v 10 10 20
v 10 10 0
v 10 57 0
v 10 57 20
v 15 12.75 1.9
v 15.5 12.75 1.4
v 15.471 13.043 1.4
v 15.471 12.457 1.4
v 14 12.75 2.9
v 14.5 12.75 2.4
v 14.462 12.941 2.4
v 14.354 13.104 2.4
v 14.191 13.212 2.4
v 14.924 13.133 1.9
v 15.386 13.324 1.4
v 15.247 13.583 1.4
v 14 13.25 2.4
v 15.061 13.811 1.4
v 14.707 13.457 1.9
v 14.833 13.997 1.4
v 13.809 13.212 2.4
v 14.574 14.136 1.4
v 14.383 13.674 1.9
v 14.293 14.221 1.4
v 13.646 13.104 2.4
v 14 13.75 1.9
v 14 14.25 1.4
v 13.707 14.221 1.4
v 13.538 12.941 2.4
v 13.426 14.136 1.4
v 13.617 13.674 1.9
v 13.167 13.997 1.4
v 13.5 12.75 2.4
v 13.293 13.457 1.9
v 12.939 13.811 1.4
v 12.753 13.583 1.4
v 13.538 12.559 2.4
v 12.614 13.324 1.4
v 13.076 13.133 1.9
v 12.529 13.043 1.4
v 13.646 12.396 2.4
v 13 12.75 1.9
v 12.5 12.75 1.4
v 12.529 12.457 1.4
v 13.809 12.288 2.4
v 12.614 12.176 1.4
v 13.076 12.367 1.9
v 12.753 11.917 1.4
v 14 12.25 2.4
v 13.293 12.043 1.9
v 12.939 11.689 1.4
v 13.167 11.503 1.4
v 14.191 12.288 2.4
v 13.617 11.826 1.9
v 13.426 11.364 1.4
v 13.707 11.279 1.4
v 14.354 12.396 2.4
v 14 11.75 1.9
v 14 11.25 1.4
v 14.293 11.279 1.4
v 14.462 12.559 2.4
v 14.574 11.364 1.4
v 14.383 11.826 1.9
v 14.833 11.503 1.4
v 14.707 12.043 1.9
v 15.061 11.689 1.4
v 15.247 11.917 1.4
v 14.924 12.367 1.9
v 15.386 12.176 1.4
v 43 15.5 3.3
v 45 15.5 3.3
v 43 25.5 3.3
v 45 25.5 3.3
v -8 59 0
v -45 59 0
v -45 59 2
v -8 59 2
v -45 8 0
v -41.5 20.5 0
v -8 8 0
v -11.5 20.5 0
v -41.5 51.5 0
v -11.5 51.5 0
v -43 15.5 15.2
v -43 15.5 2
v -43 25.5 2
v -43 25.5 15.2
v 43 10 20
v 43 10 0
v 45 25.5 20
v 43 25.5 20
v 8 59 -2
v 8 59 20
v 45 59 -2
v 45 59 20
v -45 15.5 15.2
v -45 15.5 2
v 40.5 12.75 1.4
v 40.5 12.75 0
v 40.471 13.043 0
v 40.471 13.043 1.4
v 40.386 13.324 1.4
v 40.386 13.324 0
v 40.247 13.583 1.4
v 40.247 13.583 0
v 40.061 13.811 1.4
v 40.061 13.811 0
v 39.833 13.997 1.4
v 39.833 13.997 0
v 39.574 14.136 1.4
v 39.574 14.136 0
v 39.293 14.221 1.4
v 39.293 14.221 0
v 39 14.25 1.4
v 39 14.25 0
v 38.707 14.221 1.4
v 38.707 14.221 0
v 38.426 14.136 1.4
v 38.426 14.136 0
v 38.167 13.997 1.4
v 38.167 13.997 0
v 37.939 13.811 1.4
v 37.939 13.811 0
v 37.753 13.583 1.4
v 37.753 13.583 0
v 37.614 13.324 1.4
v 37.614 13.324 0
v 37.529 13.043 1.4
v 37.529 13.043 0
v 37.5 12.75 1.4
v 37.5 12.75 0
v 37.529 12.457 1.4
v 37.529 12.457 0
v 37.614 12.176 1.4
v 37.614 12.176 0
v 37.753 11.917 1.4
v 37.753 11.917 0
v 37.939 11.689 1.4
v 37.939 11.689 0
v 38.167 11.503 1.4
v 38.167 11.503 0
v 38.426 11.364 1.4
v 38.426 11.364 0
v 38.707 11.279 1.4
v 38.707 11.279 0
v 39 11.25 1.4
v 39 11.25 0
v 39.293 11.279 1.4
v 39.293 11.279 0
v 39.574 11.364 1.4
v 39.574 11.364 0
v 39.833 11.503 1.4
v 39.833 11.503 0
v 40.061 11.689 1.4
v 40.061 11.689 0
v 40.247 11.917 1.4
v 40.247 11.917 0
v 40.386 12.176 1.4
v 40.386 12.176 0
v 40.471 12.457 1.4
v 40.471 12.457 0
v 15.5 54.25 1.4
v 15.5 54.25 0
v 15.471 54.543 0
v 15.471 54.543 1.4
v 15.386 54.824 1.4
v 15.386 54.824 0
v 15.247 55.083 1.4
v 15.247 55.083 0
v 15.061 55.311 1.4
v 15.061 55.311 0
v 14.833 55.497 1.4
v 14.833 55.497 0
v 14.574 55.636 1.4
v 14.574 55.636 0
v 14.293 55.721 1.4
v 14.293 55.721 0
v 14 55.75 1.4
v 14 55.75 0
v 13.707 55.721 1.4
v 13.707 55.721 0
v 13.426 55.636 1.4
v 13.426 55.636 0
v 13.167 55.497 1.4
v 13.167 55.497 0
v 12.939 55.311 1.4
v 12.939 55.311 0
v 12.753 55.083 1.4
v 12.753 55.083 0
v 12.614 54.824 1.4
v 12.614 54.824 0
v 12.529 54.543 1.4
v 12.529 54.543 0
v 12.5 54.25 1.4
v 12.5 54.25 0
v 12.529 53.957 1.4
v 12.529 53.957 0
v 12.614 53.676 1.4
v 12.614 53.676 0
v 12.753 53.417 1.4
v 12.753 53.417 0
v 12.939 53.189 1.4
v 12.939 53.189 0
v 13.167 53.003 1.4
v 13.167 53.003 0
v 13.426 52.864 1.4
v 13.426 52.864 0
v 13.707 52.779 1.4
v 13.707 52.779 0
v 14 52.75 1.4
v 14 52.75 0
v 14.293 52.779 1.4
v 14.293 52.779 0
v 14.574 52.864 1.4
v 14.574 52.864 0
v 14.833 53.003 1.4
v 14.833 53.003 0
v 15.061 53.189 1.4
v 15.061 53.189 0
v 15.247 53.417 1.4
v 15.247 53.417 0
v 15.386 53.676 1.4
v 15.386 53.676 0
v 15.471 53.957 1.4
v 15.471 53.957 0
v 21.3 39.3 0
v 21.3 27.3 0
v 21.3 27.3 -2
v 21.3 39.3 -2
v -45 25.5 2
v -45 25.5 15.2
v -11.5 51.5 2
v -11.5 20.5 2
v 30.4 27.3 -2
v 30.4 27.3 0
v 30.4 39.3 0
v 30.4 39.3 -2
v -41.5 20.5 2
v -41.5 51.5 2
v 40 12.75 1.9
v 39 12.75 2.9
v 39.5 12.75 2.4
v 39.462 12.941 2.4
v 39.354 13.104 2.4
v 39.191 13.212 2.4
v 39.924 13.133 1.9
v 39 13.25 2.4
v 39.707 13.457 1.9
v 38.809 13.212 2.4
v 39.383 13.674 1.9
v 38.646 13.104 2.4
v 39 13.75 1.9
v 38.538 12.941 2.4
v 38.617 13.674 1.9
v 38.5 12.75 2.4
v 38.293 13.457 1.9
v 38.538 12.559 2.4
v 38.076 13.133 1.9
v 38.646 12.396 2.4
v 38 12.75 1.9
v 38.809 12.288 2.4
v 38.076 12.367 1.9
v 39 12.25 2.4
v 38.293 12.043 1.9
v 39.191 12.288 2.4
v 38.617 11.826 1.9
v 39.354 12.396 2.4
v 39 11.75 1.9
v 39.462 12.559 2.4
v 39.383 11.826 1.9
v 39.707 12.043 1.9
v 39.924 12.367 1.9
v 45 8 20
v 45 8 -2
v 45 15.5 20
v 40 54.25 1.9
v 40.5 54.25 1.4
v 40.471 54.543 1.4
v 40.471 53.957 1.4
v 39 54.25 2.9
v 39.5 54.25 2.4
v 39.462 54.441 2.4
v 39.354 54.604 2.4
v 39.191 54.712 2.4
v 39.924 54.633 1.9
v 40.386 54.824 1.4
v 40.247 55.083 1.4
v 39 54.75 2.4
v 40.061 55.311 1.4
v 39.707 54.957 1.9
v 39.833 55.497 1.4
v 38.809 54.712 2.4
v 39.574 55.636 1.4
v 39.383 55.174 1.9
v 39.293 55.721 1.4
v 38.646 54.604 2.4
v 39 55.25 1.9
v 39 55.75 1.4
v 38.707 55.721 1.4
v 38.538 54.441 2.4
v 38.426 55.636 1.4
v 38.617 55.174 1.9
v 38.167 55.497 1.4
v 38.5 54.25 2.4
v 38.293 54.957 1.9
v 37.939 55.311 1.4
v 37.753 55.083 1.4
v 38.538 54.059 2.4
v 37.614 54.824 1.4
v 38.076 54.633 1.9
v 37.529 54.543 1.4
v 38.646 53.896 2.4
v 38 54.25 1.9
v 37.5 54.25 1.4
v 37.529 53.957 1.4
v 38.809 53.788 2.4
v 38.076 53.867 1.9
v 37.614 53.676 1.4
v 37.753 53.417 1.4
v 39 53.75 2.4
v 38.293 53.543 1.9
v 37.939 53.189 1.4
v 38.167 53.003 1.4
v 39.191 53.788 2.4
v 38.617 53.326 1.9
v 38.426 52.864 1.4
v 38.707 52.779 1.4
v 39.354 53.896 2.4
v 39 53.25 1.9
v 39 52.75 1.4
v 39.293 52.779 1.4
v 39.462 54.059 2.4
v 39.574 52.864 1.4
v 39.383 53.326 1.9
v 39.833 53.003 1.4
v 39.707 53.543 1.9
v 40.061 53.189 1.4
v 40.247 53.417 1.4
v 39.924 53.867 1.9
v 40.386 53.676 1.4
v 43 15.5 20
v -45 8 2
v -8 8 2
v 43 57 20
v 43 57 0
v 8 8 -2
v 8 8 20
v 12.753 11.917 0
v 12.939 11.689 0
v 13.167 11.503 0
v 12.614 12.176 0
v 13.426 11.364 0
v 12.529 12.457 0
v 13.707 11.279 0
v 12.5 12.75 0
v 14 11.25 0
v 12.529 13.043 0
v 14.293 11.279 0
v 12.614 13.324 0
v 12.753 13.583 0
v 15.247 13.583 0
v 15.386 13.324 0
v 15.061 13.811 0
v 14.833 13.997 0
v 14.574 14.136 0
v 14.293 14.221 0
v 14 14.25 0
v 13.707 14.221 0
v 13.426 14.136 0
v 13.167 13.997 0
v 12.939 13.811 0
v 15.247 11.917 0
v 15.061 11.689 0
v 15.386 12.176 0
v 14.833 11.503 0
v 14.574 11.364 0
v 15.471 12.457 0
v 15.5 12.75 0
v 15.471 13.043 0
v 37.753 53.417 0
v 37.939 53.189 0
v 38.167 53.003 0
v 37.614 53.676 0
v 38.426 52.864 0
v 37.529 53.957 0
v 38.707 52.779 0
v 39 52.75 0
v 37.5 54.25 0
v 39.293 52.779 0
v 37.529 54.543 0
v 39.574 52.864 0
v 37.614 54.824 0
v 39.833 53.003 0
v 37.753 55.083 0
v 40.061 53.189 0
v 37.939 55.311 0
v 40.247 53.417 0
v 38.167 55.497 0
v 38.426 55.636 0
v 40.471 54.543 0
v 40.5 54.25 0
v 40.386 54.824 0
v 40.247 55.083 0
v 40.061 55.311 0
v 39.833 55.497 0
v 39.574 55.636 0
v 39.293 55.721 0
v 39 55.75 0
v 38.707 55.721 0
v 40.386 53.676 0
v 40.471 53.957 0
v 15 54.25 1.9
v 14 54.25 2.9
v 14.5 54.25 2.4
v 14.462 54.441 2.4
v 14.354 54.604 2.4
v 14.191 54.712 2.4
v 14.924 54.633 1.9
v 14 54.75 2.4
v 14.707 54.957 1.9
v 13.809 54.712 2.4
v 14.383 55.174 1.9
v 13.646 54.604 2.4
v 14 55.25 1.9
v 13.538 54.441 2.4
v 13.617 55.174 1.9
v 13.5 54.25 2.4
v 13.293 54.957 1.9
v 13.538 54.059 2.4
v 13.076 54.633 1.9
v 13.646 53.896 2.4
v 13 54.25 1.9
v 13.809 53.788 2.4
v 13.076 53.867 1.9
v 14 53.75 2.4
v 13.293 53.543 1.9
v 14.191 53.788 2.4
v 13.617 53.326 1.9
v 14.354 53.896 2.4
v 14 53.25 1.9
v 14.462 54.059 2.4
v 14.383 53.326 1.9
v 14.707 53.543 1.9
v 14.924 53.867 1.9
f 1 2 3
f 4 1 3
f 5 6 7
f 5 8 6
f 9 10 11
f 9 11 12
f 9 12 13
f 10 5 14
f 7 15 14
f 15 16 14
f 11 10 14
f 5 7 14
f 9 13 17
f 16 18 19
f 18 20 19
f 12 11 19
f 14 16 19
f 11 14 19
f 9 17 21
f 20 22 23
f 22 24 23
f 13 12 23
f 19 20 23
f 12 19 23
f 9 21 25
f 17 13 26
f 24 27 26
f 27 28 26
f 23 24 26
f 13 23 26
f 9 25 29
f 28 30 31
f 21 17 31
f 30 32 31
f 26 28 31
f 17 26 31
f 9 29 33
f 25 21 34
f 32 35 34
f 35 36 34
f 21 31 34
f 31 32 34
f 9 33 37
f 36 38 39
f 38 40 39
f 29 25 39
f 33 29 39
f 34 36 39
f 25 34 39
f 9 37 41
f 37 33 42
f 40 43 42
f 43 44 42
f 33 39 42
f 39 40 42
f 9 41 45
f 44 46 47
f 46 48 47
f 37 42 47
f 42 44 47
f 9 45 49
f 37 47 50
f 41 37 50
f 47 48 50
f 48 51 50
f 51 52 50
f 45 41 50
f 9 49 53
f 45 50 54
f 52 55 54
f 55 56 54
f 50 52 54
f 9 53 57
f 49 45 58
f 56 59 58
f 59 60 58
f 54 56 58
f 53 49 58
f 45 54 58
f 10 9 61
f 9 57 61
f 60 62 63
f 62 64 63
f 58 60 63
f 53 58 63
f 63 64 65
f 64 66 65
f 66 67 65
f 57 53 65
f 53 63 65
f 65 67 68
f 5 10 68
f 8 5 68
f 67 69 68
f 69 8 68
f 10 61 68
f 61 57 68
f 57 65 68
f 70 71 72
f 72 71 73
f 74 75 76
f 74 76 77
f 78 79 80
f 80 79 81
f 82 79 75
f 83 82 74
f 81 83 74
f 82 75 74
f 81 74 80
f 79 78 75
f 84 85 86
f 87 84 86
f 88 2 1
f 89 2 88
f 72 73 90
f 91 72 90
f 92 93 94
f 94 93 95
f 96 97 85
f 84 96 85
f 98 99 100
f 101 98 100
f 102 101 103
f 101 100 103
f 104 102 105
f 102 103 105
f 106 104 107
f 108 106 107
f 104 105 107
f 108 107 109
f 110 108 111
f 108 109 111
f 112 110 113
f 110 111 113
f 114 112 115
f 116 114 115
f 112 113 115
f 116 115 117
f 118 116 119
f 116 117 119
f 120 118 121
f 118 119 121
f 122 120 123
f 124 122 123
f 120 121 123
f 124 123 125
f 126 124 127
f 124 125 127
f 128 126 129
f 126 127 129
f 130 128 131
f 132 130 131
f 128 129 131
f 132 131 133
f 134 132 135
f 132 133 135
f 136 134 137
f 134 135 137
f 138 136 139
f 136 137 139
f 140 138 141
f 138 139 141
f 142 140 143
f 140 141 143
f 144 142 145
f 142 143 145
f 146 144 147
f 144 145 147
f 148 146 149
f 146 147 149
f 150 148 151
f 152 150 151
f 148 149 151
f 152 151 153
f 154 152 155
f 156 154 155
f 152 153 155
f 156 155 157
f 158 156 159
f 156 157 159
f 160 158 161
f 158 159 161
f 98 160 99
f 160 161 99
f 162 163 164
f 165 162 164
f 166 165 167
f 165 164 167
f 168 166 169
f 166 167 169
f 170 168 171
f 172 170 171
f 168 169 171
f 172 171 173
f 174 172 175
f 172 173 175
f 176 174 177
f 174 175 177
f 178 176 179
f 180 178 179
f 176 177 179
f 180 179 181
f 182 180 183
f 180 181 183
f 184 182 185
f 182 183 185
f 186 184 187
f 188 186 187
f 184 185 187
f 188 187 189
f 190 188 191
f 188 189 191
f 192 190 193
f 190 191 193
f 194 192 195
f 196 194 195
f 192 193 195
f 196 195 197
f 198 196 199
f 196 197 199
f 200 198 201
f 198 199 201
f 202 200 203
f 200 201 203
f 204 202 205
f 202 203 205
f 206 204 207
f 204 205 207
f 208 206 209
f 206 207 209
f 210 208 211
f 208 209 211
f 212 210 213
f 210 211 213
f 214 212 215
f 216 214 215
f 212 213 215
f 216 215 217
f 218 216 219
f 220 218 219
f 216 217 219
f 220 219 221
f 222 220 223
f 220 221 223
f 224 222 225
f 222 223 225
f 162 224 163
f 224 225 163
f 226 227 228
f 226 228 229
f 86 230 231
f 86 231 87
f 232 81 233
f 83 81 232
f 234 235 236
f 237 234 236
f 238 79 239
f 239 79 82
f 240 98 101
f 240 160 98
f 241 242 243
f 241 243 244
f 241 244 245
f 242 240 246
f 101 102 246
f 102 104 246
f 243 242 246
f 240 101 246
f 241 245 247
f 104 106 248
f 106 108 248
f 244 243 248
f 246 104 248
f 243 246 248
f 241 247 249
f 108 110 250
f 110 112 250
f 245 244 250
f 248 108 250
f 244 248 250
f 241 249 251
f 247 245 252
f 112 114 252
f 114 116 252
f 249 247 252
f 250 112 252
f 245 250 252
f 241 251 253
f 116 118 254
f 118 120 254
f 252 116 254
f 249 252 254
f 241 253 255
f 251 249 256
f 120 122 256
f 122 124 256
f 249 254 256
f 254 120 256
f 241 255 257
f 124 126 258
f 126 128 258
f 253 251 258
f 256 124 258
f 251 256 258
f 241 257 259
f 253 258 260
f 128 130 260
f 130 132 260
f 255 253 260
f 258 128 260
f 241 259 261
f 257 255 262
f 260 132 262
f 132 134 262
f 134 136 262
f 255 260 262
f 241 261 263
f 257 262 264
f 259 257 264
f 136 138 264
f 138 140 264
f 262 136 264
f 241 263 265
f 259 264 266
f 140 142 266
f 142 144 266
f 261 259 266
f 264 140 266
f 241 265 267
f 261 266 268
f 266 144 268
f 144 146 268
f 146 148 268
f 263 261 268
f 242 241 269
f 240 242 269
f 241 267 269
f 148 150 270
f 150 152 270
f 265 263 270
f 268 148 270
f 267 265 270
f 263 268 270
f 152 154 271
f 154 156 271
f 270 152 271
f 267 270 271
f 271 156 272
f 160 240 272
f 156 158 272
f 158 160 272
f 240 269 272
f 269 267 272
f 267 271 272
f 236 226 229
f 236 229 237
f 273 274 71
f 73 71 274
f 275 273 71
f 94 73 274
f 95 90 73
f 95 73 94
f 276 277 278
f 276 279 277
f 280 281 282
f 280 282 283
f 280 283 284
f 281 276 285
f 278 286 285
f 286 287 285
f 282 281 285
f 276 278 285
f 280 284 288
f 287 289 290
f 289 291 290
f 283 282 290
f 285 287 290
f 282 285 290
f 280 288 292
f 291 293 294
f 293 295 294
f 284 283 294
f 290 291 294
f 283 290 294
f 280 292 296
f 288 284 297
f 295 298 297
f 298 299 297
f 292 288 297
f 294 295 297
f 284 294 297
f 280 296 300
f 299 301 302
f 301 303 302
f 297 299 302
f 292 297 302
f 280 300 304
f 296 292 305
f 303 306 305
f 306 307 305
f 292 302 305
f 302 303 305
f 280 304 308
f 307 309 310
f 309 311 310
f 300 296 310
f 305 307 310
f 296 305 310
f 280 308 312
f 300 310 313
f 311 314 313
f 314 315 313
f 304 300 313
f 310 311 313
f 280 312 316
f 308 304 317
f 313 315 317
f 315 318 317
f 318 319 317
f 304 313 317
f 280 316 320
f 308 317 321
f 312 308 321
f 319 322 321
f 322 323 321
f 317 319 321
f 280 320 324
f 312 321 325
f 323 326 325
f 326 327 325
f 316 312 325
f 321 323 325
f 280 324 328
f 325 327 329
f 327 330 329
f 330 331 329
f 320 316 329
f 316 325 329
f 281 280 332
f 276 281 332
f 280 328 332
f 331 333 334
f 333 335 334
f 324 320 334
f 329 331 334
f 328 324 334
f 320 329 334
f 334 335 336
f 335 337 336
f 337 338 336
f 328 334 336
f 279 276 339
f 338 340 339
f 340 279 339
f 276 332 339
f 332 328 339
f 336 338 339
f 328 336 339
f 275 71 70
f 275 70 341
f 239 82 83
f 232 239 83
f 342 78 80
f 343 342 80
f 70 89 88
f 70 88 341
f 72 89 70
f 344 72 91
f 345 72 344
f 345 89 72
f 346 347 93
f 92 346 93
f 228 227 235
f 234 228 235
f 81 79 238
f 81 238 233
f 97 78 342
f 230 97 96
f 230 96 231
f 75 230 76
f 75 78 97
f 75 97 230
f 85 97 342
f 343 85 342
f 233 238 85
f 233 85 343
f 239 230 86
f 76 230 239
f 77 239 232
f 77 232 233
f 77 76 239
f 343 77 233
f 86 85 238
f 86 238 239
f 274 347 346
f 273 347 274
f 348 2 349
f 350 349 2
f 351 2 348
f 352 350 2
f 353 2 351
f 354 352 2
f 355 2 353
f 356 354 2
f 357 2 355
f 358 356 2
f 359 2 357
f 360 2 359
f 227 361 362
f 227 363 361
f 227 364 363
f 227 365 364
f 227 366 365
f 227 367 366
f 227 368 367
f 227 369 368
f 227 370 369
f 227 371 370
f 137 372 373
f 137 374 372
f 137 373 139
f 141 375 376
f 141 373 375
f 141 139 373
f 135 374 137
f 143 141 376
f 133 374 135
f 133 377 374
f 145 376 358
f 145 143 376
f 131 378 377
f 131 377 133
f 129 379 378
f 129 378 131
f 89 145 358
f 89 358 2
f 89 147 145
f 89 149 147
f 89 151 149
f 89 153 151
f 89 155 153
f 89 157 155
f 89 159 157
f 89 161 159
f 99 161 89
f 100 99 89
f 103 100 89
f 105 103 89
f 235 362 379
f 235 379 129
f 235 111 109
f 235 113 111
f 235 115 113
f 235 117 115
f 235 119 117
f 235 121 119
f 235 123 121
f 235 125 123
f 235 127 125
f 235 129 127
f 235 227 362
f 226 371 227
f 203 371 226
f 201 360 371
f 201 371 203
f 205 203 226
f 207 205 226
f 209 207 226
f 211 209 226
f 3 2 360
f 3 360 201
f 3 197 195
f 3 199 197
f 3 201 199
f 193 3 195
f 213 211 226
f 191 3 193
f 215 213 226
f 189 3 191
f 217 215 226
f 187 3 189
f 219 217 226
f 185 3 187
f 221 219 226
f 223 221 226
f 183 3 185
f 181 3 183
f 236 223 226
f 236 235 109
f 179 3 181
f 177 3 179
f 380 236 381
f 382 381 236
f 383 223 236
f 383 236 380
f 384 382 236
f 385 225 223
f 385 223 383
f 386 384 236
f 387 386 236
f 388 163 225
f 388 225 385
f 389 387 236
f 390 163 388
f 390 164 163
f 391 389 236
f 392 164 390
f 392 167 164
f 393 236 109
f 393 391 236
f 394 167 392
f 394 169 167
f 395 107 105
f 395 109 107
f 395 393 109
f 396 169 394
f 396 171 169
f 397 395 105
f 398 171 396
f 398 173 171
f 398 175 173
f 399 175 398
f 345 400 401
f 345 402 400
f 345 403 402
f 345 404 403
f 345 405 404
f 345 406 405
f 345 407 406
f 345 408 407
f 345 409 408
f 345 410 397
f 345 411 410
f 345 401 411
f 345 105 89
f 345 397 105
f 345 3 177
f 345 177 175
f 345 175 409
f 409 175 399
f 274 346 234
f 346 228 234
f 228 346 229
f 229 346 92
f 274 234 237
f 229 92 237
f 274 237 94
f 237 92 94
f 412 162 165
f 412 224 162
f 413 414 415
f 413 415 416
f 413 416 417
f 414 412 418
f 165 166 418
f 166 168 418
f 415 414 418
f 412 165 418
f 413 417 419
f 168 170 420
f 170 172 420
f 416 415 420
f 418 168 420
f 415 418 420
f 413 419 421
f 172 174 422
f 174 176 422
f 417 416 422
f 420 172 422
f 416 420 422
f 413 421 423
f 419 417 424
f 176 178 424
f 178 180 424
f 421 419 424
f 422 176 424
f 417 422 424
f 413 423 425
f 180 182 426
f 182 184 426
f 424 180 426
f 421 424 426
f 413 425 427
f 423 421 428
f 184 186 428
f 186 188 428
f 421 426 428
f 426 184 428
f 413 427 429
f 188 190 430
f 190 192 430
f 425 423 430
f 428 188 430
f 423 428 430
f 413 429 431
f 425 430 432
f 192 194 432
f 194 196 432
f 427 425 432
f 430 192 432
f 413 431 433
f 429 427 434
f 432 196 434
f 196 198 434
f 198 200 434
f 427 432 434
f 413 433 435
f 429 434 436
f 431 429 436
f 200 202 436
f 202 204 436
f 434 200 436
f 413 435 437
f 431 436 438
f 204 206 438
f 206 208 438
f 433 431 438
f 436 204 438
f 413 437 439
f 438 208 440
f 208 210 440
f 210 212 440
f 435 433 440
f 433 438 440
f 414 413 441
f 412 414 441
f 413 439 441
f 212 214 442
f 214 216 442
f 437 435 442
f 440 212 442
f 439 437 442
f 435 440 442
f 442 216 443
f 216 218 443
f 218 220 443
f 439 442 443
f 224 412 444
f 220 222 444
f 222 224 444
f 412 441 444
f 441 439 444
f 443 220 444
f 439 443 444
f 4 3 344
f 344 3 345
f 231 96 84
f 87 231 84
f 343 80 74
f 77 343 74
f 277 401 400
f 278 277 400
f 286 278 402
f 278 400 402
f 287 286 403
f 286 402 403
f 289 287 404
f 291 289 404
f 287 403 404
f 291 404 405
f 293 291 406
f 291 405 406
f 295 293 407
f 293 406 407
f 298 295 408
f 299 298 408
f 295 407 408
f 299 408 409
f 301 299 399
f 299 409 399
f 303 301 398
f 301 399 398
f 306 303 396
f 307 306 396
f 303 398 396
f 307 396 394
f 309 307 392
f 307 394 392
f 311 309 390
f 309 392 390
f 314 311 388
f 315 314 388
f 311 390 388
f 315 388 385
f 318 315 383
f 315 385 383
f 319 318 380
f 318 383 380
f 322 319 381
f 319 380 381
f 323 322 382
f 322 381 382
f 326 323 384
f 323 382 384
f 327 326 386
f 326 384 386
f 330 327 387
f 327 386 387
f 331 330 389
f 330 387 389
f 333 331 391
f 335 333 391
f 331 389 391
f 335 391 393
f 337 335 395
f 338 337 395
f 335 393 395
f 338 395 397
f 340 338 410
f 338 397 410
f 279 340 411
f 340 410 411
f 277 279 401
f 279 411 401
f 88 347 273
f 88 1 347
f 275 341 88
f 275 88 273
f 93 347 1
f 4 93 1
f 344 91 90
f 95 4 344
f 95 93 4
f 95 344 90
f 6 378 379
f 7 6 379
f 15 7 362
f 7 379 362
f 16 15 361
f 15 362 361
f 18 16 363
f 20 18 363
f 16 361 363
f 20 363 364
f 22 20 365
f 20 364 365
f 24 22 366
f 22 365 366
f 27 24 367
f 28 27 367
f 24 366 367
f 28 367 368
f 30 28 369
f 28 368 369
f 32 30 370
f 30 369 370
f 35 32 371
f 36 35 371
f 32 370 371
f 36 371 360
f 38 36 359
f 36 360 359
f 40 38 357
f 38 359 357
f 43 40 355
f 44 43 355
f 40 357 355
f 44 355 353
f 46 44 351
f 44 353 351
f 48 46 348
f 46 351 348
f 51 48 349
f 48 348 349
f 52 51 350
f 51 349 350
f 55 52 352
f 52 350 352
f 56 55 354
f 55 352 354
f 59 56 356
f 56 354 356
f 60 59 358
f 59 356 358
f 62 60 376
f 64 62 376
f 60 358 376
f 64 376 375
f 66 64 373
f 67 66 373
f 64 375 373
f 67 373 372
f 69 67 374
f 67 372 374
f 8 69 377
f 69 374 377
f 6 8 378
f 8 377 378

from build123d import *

# Parameters (mm, degrees)
SKETCH001_W     = 37
SKETCH001_H     = 51
PAD_DEPTH       = 20
PAD_DEPTH_BACK  = 2
SKETCH_W        = 33
SKETCH_H        = 47
POCKET_DEPTH    = 20
SKETCH002_W     = 9.1
SKETCH002_H     = 12
POCKET001_DEPTH = 2
SKETCH003_W     = 10
SKETCH003_H     = 16.7
POCKET002_DEPTH = 2
SKETCH007_R     = 1.5
PAD003_DEPTH    = 1.4
SKETCH004_W     = 37
SKETCH004_H     = 51
PAD001_DEPTH    = 2
SKETCH005_W     = 2
SKETCH005_H     = 10
PAD002_DEPTH    = 15.2
SKETCH006_W     = 30
SKETCH006_H     = 31
POCKET003_DEPTH = 2


with BuildPart() as body:
    # Sketch001 → Pad (new body, two sides)
    with BuildSketch(Plane.XY) as pad_sk:
        with Locations((26.5, 33.5)):
            Rectangle(SKETCH001_W, SKETCH001_H)
    extrude(amount=PAD_DEPTH)
    extrude(pad_sk.sketch, amount=-PAD_DEPTH_BACK)

    # Sketch → Pocket (cut)
    with BuildSketch(Plane.XY):
        with Locations((26.5, 33.5)):
            Rectangle(SKETCH_W, SKETCH_H)
    extrude(amount=POCKET_DEPTH, mode=Mode.SUBTRACT)

    # Sketch002 → Pocket001 (cut)
    with BuildSketch(Plane.XY):
        with Locations((25.85, 33.3)):
            Rectangle(SKETCH002_W, SKETCH002_H)
    extrude(amount=-POCKET001_DEPTH, mode=Mode.SUBTRACT)

    # Sketch003 (on Face3 of Pad) → Pocket002 (cut)
    with BuildSketch(Plane.YZ.offset(45)):
        with Locations((20.5, 11.65)):
            Rectangle(SKETCH003_W, SKETCH003_H)
    extrude(amount=-POCKET002_DEPTH, mode=Mode.SUBTRACT)

    # Sketch007 → Pad003 (join)
    with BuildSketch(Plane.XY):
        with Locations((14, 54.25)):
            Circle(SKETCH007_R)
        with Locations((39, 54.25)):
            Circle(SKETCH007_R)
        with Locations((39, 12.75)):
            Circle(SKETCH007_R)
        with Locations((14, 12.75)):
            Circle(SKETCH007_R)
    extrude(amount=PAD003_DEPTH)

    # Sketch008 (on DatumPlane) → Revolution (revolve)
    with BuildSketch(Plane(origin=(14, 54.25, 0.944186), x_dir=(1, 0, 0), z_dir=(0, -1, 0))):
        Polygon((0, 1.955814), (1.5, 0.455814), (0, 0.455814), align=None)
    revolve(axis=Axis((14, 54.25, 0.944186), (0, 0, 1)))

    # Sketch009 (on DatumPlane) → Revolution001 (revolve)
    with BuildSketch(Plane(origin=(14, 54.25, 0.944186), x_dir=(1, 0, 0), z_dir=(0, -1, 0))):
        Polygon((25, 1.955814), (26.5, 0.455814), (25, 0.455814), align=None)
    revolve(axis=Axis((39, 54.25, 0), (0, 0, 1)))

    # Sketch010 (on DatumPlane) → Revolution002 (revolve)
    with BuildSketch(Plane(origin=(14, 12.75, 0.7), x_dir=(1, 0, 0), z_dir=(0, -1, 0))):
        Polygon((0, 2.2), (1.5, 0.7), (0, 0.7), align=None)
    revolve(axis=Axis((14, 12.75, 0.7), (0, 0, 1)))

    # Sketch011 (on DatumPlane) → Revolution003 (revolve)
    with BuildSketch(Plane(origin=(14, 12.75, 0.7), x_dir=(1, 0, 0), z_dir=(0, -1, 0))):
        Polygon((25, 2.2), (26.5, 0.7), (25, 0.7), align=None)
    revolve(axis=Axis((39, 12.75, 0), (0, 0, 1)))


with BuildPart() as body001:
    # Sketch004 → Pad001 (new body)
    with BuildSketch(Plane.XY):
        with Locations((-26.5, 33.5)):
            Rectangle(SKETCH004_W, SKETCH004_H)
    extrude(amount=PAD001_DEPTH)

    # Sketch005 → Pad002 (join)
    with BuildSketch(Plane.XY):
        with Locations((-44, 20.5)):
            Rectangle(SKETCH005_W, SKETCH005_H)
    extrude(amount=PAD002_DEPTH)

    # Sketch006 → Pocket003 (cut)
    with BuildSketch(Plane.XY):
        with Locations((-26.5, 36)):
            Rectangle(SKETCH006_W, SKETCH006_H)
    extrude(amount=POCKET003_DEPTH, mode=Mode.SUBTRACT)


solid = Compound([body.part, body001.part])
